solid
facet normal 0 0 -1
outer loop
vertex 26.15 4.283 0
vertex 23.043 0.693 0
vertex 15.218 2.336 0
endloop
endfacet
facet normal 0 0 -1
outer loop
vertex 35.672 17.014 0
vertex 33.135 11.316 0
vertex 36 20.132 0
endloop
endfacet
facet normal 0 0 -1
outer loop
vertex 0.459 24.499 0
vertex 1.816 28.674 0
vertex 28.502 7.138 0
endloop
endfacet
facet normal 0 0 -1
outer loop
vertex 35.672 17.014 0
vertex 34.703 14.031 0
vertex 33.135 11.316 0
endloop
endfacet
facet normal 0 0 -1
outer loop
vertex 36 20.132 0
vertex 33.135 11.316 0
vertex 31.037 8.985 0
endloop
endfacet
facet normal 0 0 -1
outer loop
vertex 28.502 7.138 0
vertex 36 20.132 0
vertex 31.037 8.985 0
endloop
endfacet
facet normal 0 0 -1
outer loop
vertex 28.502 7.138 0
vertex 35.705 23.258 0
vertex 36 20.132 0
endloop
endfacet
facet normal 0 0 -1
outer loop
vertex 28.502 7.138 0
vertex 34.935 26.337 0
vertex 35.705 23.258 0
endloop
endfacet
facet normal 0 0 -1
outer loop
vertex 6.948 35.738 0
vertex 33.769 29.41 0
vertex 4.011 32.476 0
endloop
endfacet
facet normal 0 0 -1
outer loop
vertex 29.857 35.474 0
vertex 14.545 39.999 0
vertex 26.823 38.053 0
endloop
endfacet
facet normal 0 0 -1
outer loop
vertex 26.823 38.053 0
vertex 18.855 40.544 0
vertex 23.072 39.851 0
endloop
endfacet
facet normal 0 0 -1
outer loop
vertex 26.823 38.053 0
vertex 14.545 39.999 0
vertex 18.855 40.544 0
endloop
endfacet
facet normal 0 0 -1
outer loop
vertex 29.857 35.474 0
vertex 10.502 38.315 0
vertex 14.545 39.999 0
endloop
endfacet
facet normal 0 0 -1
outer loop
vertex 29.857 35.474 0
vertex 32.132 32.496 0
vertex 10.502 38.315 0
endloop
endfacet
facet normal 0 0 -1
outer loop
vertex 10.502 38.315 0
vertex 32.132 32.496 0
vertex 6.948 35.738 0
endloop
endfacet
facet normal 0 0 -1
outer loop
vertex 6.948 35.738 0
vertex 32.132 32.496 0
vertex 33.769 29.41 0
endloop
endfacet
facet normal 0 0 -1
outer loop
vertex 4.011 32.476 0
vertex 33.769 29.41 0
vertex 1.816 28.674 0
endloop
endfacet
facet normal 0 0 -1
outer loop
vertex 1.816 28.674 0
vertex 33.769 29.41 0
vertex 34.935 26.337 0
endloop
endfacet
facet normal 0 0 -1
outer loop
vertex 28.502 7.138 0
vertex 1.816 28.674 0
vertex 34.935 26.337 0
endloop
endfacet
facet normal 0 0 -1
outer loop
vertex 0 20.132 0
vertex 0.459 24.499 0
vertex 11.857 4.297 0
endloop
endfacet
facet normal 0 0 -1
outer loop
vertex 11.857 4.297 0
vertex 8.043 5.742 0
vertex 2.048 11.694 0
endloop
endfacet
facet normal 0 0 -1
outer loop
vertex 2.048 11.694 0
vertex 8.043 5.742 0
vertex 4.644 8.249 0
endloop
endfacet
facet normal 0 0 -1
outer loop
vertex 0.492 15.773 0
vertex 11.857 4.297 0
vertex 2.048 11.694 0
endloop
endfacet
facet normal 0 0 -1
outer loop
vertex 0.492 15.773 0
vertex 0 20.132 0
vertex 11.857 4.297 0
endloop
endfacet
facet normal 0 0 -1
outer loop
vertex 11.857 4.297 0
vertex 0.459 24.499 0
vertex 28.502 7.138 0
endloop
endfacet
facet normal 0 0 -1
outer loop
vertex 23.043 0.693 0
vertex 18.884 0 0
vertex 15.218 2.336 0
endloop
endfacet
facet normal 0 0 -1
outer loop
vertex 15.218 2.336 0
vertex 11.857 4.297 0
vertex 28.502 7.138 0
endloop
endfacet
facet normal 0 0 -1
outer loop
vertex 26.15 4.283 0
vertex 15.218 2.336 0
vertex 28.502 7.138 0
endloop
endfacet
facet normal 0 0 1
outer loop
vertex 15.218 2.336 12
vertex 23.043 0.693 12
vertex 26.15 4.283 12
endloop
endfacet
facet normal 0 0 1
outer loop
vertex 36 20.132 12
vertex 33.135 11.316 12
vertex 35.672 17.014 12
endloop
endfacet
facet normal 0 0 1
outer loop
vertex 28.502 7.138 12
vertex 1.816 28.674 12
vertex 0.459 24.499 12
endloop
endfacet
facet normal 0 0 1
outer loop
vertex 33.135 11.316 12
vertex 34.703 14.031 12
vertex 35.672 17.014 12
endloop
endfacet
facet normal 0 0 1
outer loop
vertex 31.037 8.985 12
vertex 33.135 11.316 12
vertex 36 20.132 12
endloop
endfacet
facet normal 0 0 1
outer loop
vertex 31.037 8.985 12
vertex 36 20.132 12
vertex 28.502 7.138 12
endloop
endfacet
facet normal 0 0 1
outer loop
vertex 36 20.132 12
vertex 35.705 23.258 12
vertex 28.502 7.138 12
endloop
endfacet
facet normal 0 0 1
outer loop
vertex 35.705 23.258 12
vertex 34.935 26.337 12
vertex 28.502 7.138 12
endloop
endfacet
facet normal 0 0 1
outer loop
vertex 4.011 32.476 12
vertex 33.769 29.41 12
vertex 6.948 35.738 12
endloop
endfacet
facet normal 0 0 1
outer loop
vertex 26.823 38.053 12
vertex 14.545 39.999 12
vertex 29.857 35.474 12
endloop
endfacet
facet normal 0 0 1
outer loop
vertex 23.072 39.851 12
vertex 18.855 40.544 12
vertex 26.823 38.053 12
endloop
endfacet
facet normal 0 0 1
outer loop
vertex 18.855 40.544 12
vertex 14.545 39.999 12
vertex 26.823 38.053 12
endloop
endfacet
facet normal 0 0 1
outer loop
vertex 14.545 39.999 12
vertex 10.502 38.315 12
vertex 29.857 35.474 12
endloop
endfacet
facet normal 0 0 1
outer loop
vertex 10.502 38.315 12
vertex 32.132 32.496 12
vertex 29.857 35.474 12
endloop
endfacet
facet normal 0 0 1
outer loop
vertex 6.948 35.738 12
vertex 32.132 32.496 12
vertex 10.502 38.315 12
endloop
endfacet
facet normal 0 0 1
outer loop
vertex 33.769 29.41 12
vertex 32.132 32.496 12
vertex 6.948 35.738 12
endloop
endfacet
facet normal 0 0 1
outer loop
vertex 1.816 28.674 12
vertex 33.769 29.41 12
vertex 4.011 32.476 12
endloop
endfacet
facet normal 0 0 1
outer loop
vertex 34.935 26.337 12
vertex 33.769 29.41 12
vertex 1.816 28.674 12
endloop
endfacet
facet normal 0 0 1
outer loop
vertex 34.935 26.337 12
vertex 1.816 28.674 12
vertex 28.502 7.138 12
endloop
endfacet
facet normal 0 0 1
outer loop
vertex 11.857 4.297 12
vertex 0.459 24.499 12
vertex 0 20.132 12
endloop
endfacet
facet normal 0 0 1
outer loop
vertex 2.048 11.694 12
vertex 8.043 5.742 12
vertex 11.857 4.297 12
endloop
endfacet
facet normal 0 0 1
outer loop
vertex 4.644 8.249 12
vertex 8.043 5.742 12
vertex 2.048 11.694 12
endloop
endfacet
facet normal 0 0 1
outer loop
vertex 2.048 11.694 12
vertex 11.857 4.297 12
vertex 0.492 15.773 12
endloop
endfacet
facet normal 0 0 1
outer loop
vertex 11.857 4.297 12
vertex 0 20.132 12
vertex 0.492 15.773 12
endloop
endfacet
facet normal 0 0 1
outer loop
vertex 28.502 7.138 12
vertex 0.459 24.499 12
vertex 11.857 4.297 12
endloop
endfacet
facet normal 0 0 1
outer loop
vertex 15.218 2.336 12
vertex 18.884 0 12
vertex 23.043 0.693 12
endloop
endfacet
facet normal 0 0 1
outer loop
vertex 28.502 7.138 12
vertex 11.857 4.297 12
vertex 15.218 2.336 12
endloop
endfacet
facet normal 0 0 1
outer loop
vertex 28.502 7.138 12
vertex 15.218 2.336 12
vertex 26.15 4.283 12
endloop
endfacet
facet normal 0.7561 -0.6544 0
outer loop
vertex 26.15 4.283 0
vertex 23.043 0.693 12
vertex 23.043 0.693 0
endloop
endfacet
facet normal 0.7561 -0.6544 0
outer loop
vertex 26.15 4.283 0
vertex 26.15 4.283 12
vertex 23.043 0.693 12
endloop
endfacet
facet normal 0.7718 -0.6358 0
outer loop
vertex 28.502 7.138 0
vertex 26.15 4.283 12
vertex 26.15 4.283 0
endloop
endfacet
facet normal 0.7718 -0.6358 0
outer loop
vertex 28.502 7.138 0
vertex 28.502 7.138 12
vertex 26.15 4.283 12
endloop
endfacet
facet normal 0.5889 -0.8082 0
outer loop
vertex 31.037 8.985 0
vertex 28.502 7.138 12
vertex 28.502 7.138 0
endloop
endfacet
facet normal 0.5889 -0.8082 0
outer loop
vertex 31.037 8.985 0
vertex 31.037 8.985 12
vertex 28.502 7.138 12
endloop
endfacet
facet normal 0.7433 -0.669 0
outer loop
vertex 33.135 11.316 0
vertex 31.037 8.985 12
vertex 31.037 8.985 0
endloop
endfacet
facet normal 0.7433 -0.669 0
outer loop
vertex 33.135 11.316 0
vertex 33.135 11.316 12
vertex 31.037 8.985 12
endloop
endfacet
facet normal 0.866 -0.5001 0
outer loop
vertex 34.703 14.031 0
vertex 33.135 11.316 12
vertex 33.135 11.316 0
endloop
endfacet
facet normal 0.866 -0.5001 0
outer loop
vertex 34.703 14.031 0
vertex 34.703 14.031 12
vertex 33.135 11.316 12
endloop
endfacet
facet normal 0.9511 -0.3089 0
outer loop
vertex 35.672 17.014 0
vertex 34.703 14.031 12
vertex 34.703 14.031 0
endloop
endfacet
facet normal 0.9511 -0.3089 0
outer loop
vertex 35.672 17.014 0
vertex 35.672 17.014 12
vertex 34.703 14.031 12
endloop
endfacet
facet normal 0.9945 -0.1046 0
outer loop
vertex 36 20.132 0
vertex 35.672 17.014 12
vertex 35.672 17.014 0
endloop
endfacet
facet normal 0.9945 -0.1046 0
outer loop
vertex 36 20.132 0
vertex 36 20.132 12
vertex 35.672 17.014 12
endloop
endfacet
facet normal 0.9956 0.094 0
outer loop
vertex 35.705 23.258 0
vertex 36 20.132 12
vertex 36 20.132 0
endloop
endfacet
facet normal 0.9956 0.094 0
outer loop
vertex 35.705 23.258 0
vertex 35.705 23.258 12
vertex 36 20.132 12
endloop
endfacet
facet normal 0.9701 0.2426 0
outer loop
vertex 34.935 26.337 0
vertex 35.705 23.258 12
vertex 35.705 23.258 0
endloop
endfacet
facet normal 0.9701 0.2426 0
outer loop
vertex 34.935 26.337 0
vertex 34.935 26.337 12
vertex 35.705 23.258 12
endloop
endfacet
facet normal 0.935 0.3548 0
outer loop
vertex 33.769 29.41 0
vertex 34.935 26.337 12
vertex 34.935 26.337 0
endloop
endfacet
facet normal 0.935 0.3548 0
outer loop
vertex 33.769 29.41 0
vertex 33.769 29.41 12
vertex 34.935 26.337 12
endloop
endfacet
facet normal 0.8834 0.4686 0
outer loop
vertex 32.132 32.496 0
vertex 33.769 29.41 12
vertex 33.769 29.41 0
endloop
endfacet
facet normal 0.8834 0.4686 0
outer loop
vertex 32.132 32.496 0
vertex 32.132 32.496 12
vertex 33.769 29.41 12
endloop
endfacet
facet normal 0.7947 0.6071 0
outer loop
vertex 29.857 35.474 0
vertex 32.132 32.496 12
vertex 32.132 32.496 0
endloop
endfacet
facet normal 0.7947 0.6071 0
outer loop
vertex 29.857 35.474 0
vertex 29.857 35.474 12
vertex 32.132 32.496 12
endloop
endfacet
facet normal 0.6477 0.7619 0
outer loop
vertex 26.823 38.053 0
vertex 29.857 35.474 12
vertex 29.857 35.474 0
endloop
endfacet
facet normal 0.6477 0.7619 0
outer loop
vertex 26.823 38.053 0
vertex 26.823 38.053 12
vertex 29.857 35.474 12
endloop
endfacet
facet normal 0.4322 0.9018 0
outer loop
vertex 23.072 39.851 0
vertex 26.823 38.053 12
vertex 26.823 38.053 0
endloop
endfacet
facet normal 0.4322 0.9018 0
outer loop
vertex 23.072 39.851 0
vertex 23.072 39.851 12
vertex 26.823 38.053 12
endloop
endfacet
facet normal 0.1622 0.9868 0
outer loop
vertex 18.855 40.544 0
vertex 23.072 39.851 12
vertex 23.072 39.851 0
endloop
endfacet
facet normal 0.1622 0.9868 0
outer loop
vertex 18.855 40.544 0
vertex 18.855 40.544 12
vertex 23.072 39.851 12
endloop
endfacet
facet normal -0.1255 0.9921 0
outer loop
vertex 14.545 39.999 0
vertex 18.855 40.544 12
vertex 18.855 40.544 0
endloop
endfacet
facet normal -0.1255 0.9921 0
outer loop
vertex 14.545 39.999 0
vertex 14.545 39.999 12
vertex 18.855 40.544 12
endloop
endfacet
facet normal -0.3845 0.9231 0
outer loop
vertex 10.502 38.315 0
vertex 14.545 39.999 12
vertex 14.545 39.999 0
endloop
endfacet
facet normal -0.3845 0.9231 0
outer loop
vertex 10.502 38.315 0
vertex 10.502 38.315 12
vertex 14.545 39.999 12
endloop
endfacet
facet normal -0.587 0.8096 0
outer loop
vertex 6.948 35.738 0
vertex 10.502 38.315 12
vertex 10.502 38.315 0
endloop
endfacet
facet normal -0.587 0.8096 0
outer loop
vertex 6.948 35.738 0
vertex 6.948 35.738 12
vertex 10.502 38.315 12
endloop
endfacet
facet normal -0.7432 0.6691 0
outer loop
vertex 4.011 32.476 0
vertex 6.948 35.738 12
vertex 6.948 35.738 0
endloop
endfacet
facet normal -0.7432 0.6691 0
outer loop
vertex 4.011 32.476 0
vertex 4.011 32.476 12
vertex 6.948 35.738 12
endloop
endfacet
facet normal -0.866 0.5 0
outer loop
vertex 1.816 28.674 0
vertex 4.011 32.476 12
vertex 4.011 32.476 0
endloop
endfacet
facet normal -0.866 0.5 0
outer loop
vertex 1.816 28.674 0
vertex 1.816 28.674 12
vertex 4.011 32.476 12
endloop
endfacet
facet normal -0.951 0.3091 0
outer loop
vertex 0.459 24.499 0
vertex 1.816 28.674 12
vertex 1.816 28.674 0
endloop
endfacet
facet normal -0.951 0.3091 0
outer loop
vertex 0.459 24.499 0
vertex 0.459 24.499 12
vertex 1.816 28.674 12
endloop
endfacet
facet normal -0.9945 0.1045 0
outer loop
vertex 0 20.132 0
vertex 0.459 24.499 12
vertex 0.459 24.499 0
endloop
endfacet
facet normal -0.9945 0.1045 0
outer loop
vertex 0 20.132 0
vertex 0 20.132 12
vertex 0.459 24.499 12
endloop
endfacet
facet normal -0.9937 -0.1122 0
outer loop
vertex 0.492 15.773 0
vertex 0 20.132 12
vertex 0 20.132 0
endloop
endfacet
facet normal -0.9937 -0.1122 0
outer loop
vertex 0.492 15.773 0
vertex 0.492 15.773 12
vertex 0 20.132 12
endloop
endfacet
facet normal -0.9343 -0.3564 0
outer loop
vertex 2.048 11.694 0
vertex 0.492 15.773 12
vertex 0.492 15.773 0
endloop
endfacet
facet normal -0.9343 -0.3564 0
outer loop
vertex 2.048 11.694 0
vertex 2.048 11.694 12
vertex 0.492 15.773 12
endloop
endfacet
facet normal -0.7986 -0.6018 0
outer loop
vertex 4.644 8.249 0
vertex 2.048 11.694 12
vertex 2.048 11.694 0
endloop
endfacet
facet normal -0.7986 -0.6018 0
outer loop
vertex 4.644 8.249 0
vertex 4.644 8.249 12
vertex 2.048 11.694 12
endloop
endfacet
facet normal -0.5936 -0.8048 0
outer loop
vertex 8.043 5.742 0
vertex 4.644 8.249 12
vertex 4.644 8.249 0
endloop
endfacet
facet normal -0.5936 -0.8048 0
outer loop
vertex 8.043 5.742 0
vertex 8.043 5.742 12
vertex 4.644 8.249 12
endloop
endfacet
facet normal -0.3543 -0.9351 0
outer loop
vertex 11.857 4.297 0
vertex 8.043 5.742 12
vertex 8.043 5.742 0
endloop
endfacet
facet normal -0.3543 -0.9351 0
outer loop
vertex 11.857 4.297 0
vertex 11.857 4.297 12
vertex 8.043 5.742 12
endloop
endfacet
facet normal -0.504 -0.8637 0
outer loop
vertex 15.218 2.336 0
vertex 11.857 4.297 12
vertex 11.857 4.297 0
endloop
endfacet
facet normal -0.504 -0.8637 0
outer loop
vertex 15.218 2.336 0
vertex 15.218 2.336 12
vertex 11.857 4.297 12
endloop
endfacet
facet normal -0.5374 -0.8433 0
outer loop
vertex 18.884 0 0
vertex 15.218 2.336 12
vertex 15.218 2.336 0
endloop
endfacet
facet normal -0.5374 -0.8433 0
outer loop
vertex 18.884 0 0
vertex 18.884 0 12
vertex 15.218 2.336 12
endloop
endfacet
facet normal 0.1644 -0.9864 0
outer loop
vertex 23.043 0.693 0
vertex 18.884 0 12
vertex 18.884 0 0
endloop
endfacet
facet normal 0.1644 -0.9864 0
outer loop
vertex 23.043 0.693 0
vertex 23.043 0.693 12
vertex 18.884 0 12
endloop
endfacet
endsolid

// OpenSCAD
$fn = 32;

// ----------------------------------------------------------------------
// Cam disc: base radius 15.0 mm, lift 6.0 mm, 30 profile points
// ----------------------------------------------------------------------

// --- parameters (mm) ---
profile_height = 12;      // extrusion height
profile_points = 30;      // points of the closed outline

profile = [[36, 20.132], [35.705, 23.258], [34.935, 26.337], [33.769, 29.41], [32.132, 32.496], [29.857, 35.474], [26.823, 38.053], [23.072, 39.851], [18.855, 40.544], [14.545, 39.999], [10.502, 38.315], [6.948, 35.738], [4.011, 32.476], [1.816, 28.674], [0.459, 24.499], [0, 20.132], [0.492, 15.773], [2.048, 11.694], [4.644, 8.249], [8.043, 5.742], [11.857, 4.297], [15.218, 2.336], [18.884, 0], [23.043, 0.693], [26.15, 4.283], [28.502, 7.138], [31.037, 8.985], [33.135, 11.316], [34.703, 14.031], [35.672, 17.014]];  // single closed polygon, 30 points, counter clockwise

// --- the one profile operation ---
linear_extrude(height = profile_height) polygon(points = profile);
